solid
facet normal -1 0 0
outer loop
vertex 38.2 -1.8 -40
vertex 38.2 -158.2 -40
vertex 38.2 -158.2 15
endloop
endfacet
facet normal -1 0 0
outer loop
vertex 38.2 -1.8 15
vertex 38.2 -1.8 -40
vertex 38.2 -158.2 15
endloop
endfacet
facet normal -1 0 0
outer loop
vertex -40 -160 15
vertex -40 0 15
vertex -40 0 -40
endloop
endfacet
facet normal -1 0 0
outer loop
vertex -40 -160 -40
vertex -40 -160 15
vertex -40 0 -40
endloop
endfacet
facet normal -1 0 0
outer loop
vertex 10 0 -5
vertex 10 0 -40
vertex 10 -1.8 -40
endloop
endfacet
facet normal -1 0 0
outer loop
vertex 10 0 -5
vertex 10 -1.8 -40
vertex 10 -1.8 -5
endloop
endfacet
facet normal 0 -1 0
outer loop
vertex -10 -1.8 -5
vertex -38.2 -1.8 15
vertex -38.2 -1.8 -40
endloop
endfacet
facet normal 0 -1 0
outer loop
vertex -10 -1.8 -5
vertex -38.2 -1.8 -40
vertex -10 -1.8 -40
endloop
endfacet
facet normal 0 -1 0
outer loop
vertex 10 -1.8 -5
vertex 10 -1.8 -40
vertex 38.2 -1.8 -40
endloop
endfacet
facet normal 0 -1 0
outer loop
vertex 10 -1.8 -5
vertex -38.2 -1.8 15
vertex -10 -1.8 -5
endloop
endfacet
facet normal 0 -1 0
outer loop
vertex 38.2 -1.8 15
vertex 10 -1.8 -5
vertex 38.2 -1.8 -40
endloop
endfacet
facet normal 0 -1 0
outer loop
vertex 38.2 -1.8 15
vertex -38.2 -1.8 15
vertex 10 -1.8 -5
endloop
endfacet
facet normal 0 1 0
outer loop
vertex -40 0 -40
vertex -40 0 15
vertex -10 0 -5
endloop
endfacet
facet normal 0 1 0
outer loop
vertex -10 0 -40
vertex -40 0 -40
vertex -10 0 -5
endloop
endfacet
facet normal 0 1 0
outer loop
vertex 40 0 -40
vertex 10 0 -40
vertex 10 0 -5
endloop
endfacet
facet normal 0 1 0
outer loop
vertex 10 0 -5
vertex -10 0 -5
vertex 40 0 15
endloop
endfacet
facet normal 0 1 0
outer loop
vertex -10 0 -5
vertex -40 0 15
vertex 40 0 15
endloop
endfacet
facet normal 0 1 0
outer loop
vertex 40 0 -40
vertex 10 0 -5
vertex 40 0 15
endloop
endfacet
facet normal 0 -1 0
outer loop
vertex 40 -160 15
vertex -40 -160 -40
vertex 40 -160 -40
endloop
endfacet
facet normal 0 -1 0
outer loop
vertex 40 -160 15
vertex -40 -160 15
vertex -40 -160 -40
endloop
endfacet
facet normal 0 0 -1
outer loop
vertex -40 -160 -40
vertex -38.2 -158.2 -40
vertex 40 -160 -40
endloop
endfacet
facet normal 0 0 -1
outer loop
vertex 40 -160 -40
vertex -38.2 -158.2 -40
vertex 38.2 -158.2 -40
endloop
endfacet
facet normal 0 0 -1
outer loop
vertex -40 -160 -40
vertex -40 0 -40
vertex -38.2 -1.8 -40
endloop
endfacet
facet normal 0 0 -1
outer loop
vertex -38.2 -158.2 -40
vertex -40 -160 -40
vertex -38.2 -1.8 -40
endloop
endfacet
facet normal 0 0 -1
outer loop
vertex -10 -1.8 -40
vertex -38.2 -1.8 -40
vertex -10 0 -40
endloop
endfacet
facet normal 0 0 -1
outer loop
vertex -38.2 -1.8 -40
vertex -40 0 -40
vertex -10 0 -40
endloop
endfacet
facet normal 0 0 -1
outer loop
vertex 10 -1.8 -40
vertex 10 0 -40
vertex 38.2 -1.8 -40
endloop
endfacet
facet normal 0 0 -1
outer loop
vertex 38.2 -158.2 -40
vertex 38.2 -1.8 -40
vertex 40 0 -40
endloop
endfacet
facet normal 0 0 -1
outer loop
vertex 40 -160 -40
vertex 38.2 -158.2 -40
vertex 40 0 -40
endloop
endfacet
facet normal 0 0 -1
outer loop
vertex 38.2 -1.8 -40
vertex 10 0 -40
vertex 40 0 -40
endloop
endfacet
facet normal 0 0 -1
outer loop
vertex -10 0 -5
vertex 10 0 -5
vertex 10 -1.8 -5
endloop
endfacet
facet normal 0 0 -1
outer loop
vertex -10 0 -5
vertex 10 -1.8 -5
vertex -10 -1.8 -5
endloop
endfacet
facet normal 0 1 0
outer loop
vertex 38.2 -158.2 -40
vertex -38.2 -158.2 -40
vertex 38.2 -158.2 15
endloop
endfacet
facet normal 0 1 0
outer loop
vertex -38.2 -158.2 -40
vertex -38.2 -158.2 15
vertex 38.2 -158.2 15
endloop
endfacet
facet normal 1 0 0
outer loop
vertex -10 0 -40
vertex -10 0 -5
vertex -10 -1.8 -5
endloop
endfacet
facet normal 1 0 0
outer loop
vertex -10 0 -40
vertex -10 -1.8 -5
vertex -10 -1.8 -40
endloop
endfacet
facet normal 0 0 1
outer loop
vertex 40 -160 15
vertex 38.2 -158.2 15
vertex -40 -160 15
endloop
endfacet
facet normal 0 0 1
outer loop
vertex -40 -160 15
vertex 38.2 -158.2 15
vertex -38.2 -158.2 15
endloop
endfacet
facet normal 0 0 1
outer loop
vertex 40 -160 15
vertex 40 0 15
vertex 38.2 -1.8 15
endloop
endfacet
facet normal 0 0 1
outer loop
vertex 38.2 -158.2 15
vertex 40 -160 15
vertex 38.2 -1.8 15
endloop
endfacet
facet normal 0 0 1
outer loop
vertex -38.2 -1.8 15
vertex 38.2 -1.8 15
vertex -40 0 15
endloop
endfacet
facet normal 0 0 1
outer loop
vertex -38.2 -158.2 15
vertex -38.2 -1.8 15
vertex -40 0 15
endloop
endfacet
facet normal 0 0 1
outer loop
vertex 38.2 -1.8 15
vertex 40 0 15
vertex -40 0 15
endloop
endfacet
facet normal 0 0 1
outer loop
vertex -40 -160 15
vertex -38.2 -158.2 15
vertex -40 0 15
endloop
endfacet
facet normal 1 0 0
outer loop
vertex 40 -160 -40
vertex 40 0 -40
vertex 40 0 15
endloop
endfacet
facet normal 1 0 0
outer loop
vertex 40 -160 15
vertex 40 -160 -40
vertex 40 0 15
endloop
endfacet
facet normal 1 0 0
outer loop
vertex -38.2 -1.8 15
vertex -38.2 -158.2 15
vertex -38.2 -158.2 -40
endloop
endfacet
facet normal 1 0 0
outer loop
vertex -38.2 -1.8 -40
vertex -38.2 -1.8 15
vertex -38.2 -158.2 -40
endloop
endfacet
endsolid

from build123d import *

# Parameters (mm, degrees)
F1_DEPTH = 160
F3_T     = -1.8
F4_DEPTH = 1.8


with BuildPart() as f1:
    # F0 (on Front) → F1 (new body)
    with BuildSketch(Plane.XZ):
        Polygon((-40, 0), (-40, -40), (-10, -40), (10, -40), (40, -40), (40, 15), (-40, 15), align=None)
    extrude(amount=F1_DEPTH)

    # F3
    f3_openings = [f1.faces().sort_by_distance(p)[0] for p in [
        (0, -80, 15),
        (0, -80, -40),
    ]]
    offset(amount=F3_T, openings=f3_openings)

    # F2 (on Front) → F4 (cut)
    with BuildSketch(Plane.XZ):
        Polygon((10, -5), (0, -5), (-10, -5), (-10, -40), (10, -40), align=None)
    extrude(amount=F4_DEPTH, mode=Mode.SUBTRACT)


solid = f1.part
